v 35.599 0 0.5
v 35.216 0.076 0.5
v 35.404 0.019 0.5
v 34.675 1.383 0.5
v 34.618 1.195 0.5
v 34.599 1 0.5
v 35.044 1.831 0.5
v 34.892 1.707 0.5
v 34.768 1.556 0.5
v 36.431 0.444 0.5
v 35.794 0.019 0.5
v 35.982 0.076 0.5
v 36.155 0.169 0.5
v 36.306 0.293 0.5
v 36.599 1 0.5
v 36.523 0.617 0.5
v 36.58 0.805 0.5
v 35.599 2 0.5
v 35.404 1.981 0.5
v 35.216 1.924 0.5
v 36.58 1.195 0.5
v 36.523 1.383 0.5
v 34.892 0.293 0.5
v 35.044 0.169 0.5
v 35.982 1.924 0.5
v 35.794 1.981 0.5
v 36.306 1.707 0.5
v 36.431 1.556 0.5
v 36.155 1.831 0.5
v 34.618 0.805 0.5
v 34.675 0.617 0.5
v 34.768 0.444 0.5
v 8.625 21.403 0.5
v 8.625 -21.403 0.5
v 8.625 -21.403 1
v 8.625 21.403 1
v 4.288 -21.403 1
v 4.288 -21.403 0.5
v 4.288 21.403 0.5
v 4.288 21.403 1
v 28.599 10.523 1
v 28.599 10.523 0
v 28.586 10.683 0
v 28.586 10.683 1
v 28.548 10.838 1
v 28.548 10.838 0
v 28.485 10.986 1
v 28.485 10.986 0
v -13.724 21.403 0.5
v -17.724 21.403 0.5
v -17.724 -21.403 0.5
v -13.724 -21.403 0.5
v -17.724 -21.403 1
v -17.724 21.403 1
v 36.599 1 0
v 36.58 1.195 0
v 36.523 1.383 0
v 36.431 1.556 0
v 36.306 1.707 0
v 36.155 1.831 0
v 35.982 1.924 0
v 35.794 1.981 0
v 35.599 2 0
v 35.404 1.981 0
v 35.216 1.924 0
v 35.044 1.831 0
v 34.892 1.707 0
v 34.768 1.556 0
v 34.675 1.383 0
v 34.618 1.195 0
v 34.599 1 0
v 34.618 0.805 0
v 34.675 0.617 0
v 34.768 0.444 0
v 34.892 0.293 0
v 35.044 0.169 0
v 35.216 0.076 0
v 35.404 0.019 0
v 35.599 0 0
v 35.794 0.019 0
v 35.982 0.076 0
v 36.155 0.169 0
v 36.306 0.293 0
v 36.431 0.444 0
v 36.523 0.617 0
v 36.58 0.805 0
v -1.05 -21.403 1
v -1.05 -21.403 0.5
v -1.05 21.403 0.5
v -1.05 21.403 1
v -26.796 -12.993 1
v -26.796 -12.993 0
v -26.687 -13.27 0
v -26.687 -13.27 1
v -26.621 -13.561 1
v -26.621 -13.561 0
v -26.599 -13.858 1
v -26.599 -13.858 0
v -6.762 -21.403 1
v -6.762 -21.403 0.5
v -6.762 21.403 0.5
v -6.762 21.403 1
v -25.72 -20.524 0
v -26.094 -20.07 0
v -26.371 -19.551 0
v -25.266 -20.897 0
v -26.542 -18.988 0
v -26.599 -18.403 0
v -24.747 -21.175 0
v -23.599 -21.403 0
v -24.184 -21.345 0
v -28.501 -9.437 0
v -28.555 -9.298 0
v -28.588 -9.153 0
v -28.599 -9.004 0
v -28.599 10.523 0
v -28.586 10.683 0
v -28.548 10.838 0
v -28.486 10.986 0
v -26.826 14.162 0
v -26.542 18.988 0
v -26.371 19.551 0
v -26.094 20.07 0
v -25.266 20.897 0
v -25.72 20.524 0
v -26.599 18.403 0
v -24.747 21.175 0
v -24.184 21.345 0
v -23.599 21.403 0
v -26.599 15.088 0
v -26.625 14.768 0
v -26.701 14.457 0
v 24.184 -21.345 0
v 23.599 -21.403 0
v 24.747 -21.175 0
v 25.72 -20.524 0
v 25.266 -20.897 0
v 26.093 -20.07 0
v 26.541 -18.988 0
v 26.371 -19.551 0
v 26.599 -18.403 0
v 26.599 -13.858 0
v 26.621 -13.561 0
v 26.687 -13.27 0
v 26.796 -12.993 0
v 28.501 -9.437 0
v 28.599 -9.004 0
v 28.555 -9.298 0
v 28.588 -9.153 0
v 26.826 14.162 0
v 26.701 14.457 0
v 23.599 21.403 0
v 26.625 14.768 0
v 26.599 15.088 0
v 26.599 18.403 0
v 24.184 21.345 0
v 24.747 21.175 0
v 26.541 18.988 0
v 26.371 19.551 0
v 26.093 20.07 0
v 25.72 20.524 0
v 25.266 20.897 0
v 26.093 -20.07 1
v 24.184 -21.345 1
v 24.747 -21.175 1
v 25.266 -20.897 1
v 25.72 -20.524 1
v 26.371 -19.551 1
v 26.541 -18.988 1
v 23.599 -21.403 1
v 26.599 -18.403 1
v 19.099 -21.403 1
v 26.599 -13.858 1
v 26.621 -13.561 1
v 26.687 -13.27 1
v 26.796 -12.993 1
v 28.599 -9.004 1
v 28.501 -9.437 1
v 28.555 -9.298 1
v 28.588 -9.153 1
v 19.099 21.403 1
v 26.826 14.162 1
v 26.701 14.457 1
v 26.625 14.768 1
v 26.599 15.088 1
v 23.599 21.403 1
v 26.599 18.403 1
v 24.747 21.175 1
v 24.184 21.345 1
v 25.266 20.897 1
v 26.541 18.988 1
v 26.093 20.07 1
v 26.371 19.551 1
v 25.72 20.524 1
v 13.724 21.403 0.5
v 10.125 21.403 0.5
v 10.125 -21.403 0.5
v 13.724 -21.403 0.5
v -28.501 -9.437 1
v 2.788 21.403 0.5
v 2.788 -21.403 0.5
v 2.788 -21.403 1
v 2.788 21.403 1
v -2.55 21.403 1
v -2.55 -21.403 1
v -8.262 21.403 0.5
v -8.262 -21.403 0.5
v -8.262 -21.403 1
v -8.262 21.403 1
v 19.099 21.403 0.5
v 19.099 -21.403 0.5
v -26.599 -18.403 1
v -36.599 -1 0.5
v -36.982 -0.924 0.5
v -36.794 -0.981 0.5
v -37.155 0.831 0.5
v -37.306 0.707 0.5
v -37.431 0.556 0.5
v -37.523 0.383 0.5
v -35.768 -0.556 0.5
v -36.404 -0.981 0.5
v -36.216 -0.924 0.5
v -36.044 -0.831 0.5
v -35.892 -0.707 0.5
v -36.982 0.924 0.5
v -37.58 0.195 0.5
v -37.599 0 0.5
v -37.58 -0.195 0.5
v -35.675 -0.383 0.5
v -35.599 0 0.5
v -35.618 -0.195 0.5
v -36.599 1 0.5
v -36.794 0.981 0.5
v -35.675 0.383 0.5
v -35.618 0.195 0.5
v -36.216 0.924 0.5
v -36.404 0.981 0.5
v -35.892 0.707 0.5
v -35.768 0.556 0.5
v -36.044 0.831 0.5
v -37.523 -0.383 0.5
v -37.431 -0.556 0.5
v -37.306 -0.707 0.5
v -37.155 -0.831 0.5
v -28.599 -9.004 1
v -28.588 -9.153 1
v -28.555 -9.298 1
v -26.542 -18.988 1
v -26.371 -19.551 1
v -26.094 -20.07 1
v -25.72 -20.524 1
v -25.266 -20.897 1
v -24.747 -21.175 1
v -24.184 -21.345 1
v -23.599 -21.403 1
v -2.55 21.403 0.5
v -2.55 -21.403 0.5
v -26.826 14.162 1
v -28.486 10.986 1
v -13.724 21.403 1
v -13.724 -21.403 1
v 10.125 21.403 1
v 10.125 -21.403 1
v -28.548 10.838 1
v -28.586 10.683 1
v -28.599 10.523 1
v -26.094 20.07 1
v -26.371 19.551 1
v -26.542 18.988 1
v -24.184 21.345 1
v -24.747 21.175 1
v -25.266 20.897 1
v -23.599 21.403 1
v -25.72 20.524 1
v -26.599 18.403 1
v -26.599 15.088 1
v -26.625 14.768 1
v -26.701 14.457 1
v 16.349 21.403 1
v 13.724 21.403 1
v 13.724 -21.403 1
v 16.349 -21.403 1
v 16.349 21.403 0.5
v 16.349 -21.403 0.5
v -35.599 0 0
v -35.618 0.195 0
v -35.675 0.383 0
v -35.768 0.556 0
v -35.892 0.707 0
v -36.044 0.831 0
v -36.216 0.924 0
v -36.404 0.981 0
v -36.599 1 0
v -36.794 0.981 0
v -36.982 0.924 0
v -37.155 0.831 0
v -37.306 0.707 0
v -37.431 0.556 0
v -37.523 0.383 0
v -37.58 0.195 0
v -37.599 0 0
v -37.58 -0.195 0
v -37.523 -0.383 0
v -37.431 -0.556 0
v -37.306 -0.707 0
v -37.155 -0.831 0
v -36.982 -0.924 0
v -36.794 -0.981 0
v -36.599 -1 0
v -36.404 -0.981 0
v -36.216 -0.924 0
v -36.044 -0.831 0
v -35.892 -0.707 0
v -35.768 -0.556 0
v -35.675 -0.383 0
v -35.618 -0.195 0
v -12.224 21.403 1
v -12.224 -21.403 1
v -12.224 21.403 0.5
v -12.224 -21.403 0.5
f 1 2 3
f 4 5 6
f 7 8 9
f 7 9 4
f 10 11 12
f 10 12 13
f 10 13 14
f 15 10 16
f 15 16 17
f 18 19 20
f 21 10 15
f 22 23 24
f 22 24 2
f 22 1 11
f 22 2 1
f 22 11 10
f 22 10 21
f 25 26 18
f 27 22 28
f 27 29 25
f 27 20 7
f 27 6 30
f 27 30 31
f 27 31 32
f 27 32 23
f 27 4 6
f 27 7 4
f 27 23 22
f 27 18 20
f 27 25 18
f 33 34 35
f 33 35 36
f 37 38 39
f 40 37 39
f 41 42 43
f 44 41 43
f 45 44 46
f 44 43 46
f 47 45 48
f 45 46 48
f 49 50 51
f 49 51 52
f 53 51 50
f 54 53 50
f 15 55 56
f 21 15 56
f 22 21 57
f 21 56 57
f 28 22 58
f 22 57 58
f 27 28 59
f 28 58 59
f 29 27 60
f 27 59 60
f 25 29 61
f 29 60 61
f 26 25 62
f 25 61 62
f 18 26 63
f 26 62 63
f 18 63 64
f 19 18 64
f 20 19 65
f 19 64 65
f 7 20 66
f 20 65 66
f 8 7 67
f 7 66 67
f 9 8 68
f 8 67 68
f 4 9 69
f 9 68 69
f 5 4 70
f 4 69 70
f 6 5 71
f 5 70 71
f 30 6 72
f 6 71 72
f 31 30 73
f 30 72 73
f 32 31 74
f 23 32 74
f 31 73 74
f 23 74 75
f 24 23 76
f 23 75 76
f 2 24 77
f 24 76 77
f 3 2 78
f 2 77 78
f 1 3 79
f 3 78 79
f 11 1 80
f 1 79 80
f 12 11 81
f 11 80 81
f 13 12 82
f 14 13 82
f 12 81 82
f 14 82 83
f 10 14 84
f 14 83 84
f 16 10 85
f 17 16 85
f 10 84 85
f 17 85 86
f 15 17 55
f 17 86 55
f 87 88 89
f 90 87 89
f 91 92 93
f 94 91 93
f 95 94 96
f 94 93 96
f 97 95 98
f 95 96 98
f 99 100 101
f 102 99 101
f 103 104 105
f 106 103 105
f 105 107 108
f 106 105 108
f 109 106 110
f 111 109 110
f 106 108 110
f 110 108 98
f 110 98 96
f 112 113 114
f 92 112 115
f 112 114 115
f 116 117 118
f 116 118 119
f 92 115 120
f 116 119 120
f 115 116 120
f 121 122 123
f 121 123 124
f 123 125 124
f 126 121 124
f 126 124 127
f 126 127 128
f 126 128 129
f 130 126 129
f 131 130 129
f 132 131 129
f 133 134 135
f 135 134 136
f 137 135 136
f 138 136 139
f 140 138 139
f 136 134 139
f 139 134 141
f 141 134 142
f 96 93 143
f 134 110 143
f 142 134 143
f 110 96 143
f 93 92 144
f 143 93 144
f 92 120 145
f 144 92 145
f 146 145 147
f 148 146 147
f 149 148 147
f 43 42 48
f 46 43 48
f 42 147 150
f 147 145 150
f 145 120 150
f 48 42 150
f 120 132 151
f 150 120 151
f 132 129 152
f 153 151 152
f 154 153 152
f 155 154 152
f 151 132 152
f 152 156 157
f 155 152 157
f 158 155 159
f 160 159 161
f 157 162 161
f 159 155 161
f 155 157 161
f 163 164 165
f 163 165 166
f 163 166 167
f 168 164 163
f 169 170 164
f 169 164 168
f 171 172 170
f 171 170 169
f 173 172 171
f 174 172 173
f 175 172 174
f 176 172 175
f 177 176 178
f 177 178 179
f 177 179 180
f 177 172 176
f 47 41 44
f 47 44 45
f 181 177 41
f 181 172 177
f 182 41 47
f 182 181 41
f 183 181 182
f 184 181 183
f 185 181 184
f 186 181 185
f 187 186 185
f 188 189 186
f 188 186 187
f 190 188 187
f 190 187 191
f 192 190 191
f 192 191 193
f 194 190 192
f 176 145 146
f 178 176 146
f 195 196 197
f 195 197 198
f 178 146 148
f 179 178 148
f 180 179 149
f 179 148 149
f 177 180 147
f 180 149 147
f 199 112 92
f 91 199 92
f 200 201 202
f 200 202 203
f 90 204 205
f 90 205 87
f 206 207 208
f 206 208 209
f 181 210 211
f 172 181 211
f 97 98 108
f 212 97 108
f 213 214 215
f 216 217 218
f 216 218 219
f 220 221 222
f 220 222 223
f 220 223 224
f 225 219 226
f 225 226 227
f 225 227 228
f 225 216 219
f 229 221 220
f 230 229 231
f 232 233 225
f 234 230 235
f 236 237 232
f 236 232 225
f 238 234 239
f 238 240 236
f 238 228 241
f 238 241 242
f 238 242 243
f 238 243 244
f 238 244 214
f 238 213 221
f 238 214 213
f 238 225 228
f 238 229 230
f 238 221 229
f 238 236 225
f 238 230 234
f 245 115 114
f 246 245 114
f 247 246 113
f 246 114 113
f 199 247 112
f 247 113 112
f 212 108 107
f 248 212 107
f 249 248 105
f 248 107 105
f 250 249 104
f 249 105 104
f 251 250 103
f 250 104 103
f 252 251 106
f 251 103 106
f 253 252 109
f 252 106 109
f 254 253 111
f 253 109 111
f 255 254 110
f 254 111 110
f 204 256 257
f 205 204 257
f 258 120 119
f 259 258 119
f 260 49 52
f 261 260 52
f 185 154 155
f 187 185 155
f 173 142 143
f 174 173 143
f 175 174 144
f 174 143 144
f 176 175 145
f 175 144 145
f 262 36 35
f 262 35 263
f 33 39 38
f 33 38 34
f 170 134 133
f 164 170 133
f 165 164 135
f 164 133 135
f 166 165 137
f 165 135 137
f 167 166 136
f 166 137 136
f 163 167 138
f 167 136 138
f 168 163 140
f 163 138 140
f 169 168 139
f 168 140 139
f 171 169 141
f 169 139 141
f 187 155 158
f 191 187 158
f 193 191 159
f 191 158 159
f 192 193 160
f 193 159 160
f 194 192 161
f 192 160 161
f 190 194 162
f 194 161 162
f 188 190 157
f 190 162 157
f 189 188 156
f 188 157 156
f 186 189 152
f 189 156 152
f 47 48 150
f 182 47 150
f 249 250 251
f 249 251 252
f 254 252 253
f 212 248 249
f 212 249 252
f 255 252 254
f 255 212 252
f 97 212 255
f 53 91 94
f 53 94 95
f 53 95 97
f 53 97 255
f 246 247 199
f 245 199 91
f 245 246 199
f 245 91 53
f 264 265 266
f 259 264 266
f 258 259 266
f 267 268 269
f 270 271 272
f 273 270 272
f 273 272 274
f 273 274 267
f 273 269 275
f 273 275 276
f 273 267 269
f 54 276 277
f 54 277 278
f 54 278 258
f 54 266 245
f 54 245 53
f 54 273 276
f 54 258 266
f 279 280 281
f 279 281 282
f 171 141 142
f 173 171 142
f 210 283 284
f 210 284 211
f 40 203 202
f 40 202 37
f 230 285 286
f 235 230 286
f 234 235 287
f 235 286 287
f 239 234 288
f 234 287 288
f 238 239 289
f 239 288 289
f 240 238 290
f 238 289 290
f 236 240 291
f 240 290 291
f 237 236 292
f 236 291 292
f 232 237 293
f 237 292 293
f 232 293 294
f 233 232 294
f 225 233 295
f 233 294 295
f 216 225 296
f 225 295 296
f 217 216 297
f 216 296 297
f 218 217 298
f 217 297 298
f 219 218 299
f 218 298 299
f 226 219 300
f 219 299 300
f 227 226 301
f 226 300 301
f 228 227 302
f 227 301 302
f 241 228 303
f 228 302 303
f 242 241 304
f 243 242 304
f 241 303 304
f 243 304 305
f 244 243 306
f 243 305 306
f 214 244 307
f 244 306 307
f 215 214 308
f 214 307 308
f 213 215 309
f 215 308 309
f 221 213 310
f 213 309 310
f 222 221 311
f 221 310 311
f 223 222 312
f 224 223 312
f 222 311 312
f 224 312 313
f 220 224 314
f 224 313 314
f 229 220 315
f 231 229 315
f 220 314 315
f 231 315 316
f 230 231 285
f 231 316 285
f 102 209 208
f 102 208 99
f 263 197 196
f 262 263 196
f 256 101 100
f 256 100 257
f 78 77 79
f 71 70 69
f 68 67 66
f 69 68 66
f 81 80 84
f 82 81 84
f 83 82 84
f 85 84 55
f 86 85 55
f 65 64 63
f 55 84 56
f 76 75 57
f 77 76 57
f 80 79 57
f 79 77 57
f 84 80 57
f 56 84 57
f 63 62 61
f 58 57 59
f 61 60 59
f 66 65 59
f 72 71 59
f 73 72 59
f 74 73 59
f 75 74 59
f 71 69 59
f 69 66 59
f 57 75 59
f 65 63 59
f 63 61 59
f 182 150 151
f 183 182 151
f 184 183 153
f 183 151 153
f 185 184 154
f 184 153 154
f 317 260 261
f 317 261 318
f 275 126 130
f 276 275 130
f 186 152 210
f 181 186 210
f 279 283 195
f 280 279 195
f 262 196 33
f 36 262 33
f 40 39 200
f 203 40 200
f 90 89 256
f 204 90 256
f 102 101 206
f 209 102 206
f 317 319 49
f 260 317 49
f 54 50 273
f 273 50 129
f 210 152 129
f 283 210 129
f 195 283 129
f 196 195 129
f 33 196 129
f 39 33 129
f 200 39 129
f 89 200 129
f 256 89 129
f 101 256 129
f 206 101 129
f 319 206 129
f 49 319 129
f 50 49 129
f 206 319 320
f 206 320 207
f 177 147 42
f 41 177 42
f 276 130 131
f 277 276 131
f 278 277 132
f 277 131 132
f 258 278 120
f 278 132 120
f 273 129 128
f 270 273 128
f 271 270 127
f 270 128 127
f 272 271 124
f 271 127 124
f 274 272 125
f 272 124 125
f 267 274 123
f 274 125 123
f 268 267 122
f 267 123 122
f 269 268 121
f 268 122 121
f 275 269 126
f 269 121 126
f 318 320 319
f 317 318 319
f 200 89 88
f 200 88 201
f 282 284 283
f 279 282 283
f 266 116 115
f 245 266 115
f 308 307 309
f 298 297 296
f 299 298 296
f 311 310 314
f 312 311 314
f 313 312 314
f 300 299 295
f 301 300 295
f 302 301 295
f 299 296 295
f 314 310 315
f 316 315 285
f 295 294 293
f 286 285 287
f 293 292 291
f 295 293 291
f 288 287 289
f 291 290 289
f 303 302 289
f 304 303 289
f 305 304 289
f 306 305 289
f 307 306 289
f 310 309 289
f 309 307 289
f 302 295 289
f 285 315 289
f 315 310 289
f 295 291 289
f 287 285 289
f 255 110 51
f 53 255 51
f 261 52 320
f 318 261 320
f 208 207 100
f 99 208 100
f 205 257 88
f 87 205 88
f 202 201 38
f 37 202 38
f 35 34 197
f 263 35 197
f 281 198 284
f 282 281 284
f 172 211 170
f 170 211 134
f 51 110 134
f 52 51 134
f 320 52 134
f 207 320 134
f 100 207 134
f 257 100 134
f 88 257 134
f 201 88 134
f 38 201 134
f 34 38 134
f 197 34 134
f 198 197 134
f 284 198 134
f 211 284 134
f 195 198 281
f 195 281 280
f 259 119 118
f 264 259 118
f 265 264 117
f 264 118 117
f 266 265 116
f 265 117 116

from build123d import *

# Parameters (mm, degrees)
F5_DEPTH  = 1
F6_DEPTH  = 1
F4_W      = 1.5
F4_H      = 42.806028
F7_DEPTH  = 1
F8_DEPTH  = 1
F9_DEPTH  = 1
F10_DEPTH = 1
F4_W_2    = 2.625
F11_DEPTH = 1
F12_DEPTH = 1
F13_DEPTH = 0.5
F14_R     = 1
F15_DEPTH = 0.5


with BuildPart() as f5:
    # F4 (on Top) → F5 (new body)
    with BuildSketch(Plane.XY):
        with BuildLine():
            ThreePointArc((-26.79573, -12.992989), (-26.64891, -13.414307), (-26.599151, -13.85769))
            Line((-26.599151, -13.85769), (-26.599151, -18.40302))
            ThreePointArc((-26.599151, -18.40302), (-25.72047, -20.524339), (-23.599148, -21.403014))
            Line((-23.599148, -21.403014), (-17.724151, -21.403014))
            Line((-17.724151, -21.403014), (-17.724151, 21.403014))
            Line((-17.724151, 21.403014), (-23.599148, 21.403014))
            ThreePointArc((-23.599148, 21.403014), (-25.720467, 20.524337), (-26.599151, 18.40302))
            Line((-26.599151, 18.40302), (-26.599151, 15.087812))
            ThreePointArc((-26.599151, 15.087812), (-26.656802, 14.61107), (-26.82643, 14.161812))
            Line((-26.82643, 14.161812), (-28.485507, 10.985712))
            ThreePointArc((-28.485507, 10.985712), (-28.570317, 10.761104), (-28.599147, 10.522754))
            Line((-28.599147, 10.522754), (-28.599147, -9.004427))
            ThreePointArc((-28.599147, -9.004427), (-28.574265, -9.226139), (-28.500857, -9.43682))
            Line((-28.500857, -9.43682), (-26.79573, -12.992989))
        make_face()
    extrude(amount=F5_DEPTH)



with BuildPart() as f6:
    # F4 (on Top) → F6 (new body)
    with BuildSketch(Plane.XY):
        Polygon((-13.724109, 21.403014), (-13.724108, -21.403014), (-12.224108, -21.403014), (-12.224109, 21.403014), align=None)
    extrude(amount=F6_DEPTH)


with BuildPart() as f7:
    # F4 (on Top) → F7 (new body)
    with BuildSketch(Plane.XY):
        with Locations((-7.511842, 0)):
            Rectangle(F4_W, F4_H)
    extrude(amount=F7_DEPTH)


with BuildPart() as f8:
    # F4 (on Top) → F8 (new body)
    with BuildSketch(Plane.XY):
        Polygon((-2.549576, 21.403014), (-2.549575, -21.403014), (-1.049575, -21.403014), (-1.049576, 21.403014), align=None)
    extrude(amount=F8_DEPTH)


with BuildPart() as f9:
    # F4 (on Top) → F9 (new body)
    with BuildSketch(Plane.XY):
        with Locations((3.537691, 0)):
            Rectangle(F4_W, F4_H)
    extrude(amount=F9_DEPTH)


with BuildPart() as f10:
    # F4 (on Top) → F10 (new body)
    with BuildSketch(Plane.XY):
        with Locations((9.374958, 0)):
            Rectangle(F4_W, F4_H)
    extrude(amount=F10_DEPTH)


with BuildPart() as f11:
    # F4 (on Top) → F11 (new body)
    with BuildSketch(Plane.XY):
        with Locations((15.036566, 0)):
            Rectangle(F4_W_2, F4_H)
    extrude(amount=F11_DEPTH)


with BuildPart() as f12:
    # F4 (on Top) → F12 (new body)
    with BuildSketch(Plane.XY):
        with BuildLine():
            Line((19.099066, 21.403014), (19.099066, -21.403014))
            Line((19.099066, -21.403014), (23.599072, -21.403014))
            ThreePointArc((23.599072, -21.403014), (25.720388, -20.524336), (26.599066, -18.40302))
            Line((26.599066, -18.40302), (26.599066, -13.85769))
            ThreePointArc((26.599066, -13.85769), (26.648834, -13.414306), (26.795662, -12.992989))
            Line((26.795662, -12.992989), (28.500849, -9.43682))
            ThreePointArc((28.500849, -9.43682), (28.574263, -9.22614), (28.599147, -9.004427))
            Line((28.599147, -9.004427), (28.599147, 10.522754))
            ThreePointArc((28.599147, 10.522754), (28.570267, 10.761104), (28.48544, 10.985712))
            Line((28.48544, 10.985712), (26.826396, 14.161812))
            ThreePointArc((26.826396, 14.161812), (26.65673, 14.611064), (26.599066, 15.087812))
            Line((26.599066, 15.087812), (26.599066, 18.40302))
            ThreePointArc((26.599066, 18.40302), (25.720388, 20.524336), (23.599072, 21.403014))
            Line((23.599072, 21.403014), (19.099066, 21.403014))
        make_face()
    extrude(amount=F12_DEPTH)


with BuildPart() as f5_1:
    add(f5.part)

    add(f6.part)  # F13 merges F6

    add(f7.part)  # F13 merges F7

    add(f8.part)  # F13 merges F8

    add(f9.part)  # F13 merges F9

    add(f10.part)  # F13 merges F10

    add(f11.part)  # F13 merges F11

    add(f12.part)  # F13 merges F12
    # F1 (on Top) → F13 (join)
    with BuildSketch(Plane.XY):
        with BuildLine():
            ThreePointArc((-26.79573, -12.992989), (-26.64891, -13.414307), (-26.599151, -13.85769))
            Line((-26.599151, -13.85769), (-26.599151, -18.40302))
            ThreePointArc((-26.599151, -18.40302), (-25.72047, -20.524339), (-23.599148, -21.403014))
            Line((-23.599148, -21.403014), (23.599072, -21.403014))
            ThreePointArc((23.599072, -21.403014), (25.720388, -20.524336), (26.599066, -18.40302))
            Line((26.599066, -18.40302), (26.599066, -13.85769))
            ThreePointArc((26.599066, -13.85769), (26.648834, -13.414306), (26.795662, -12.992989))
            Line((26.795662, -12.992989), (28.500849, -9.43682))
            ThreePointArc((28.500849, -9.43682), (28.574263, -9.22614), (28.599147, -9.004427))
            Line((28.599147, -9.004427), (28.599147, 10.522754))
            ThreePointArc((28.599147, 10.522754), (28.570267, 10.761104), (28.48544, 10.985712))
            Line((28.48544, 10.985712), (26.826396, 14.161812))
            ThreePointArc((26.826396, 14.161812), (26.65673, 14.611064), (26.599066, 15.087812))
            Line((26.599066, 15.087812), (26.599066, 18.40302))
            ThreePointArc((26.599066, 18.40302), (25.720388, 20.524336), (23.599072, 21.403014))
            Line((23.599072, 21.403014), (-23.599148, 21.403014))
            ThreePointArc((-23.599148, 21.403014), (-25.720467, 20.524337), (-26.599151, 18.40302))
            Line((-26.599151, 18.40302), (-26.599151, 15.087812))
            ThreePointArc((-26.599151, 15.087812), (-26.656802, 14.61107), (-26.82643, 14.161812))
            Line((-26.82643, 14.161812), (-28.485507, 10.985712))
            ThreePointArc((-28.485507, 10.985712), (-28.570317, 10.761104), (-28.599147, 10.522754))
            Line((-28.599147, 10.522754), (-28.599147, -9.004427))
            ThreePointArc((-28.599147, -9.004427), (-28.574265, -9.226139), (-28.500857, -9.43682))
            Line((-28.500857, -9.43682), (-26.79573, -12.992989))
        make_face()
    extrude(amount=F13_DEPTH)


with BuildPart() as f15:
    # F14 (on Top) → F15 (new body)
    with BuildSketch(Plane.XY):
        with Locations((-36.599147, 0)):
            Circle(F14_R)
        with Locations((35.599147, 1)):
            Circle(F14_R)
    extrude(amount=F15_DEPTH)


solid = Compound([f5_1.part, f15.part])
